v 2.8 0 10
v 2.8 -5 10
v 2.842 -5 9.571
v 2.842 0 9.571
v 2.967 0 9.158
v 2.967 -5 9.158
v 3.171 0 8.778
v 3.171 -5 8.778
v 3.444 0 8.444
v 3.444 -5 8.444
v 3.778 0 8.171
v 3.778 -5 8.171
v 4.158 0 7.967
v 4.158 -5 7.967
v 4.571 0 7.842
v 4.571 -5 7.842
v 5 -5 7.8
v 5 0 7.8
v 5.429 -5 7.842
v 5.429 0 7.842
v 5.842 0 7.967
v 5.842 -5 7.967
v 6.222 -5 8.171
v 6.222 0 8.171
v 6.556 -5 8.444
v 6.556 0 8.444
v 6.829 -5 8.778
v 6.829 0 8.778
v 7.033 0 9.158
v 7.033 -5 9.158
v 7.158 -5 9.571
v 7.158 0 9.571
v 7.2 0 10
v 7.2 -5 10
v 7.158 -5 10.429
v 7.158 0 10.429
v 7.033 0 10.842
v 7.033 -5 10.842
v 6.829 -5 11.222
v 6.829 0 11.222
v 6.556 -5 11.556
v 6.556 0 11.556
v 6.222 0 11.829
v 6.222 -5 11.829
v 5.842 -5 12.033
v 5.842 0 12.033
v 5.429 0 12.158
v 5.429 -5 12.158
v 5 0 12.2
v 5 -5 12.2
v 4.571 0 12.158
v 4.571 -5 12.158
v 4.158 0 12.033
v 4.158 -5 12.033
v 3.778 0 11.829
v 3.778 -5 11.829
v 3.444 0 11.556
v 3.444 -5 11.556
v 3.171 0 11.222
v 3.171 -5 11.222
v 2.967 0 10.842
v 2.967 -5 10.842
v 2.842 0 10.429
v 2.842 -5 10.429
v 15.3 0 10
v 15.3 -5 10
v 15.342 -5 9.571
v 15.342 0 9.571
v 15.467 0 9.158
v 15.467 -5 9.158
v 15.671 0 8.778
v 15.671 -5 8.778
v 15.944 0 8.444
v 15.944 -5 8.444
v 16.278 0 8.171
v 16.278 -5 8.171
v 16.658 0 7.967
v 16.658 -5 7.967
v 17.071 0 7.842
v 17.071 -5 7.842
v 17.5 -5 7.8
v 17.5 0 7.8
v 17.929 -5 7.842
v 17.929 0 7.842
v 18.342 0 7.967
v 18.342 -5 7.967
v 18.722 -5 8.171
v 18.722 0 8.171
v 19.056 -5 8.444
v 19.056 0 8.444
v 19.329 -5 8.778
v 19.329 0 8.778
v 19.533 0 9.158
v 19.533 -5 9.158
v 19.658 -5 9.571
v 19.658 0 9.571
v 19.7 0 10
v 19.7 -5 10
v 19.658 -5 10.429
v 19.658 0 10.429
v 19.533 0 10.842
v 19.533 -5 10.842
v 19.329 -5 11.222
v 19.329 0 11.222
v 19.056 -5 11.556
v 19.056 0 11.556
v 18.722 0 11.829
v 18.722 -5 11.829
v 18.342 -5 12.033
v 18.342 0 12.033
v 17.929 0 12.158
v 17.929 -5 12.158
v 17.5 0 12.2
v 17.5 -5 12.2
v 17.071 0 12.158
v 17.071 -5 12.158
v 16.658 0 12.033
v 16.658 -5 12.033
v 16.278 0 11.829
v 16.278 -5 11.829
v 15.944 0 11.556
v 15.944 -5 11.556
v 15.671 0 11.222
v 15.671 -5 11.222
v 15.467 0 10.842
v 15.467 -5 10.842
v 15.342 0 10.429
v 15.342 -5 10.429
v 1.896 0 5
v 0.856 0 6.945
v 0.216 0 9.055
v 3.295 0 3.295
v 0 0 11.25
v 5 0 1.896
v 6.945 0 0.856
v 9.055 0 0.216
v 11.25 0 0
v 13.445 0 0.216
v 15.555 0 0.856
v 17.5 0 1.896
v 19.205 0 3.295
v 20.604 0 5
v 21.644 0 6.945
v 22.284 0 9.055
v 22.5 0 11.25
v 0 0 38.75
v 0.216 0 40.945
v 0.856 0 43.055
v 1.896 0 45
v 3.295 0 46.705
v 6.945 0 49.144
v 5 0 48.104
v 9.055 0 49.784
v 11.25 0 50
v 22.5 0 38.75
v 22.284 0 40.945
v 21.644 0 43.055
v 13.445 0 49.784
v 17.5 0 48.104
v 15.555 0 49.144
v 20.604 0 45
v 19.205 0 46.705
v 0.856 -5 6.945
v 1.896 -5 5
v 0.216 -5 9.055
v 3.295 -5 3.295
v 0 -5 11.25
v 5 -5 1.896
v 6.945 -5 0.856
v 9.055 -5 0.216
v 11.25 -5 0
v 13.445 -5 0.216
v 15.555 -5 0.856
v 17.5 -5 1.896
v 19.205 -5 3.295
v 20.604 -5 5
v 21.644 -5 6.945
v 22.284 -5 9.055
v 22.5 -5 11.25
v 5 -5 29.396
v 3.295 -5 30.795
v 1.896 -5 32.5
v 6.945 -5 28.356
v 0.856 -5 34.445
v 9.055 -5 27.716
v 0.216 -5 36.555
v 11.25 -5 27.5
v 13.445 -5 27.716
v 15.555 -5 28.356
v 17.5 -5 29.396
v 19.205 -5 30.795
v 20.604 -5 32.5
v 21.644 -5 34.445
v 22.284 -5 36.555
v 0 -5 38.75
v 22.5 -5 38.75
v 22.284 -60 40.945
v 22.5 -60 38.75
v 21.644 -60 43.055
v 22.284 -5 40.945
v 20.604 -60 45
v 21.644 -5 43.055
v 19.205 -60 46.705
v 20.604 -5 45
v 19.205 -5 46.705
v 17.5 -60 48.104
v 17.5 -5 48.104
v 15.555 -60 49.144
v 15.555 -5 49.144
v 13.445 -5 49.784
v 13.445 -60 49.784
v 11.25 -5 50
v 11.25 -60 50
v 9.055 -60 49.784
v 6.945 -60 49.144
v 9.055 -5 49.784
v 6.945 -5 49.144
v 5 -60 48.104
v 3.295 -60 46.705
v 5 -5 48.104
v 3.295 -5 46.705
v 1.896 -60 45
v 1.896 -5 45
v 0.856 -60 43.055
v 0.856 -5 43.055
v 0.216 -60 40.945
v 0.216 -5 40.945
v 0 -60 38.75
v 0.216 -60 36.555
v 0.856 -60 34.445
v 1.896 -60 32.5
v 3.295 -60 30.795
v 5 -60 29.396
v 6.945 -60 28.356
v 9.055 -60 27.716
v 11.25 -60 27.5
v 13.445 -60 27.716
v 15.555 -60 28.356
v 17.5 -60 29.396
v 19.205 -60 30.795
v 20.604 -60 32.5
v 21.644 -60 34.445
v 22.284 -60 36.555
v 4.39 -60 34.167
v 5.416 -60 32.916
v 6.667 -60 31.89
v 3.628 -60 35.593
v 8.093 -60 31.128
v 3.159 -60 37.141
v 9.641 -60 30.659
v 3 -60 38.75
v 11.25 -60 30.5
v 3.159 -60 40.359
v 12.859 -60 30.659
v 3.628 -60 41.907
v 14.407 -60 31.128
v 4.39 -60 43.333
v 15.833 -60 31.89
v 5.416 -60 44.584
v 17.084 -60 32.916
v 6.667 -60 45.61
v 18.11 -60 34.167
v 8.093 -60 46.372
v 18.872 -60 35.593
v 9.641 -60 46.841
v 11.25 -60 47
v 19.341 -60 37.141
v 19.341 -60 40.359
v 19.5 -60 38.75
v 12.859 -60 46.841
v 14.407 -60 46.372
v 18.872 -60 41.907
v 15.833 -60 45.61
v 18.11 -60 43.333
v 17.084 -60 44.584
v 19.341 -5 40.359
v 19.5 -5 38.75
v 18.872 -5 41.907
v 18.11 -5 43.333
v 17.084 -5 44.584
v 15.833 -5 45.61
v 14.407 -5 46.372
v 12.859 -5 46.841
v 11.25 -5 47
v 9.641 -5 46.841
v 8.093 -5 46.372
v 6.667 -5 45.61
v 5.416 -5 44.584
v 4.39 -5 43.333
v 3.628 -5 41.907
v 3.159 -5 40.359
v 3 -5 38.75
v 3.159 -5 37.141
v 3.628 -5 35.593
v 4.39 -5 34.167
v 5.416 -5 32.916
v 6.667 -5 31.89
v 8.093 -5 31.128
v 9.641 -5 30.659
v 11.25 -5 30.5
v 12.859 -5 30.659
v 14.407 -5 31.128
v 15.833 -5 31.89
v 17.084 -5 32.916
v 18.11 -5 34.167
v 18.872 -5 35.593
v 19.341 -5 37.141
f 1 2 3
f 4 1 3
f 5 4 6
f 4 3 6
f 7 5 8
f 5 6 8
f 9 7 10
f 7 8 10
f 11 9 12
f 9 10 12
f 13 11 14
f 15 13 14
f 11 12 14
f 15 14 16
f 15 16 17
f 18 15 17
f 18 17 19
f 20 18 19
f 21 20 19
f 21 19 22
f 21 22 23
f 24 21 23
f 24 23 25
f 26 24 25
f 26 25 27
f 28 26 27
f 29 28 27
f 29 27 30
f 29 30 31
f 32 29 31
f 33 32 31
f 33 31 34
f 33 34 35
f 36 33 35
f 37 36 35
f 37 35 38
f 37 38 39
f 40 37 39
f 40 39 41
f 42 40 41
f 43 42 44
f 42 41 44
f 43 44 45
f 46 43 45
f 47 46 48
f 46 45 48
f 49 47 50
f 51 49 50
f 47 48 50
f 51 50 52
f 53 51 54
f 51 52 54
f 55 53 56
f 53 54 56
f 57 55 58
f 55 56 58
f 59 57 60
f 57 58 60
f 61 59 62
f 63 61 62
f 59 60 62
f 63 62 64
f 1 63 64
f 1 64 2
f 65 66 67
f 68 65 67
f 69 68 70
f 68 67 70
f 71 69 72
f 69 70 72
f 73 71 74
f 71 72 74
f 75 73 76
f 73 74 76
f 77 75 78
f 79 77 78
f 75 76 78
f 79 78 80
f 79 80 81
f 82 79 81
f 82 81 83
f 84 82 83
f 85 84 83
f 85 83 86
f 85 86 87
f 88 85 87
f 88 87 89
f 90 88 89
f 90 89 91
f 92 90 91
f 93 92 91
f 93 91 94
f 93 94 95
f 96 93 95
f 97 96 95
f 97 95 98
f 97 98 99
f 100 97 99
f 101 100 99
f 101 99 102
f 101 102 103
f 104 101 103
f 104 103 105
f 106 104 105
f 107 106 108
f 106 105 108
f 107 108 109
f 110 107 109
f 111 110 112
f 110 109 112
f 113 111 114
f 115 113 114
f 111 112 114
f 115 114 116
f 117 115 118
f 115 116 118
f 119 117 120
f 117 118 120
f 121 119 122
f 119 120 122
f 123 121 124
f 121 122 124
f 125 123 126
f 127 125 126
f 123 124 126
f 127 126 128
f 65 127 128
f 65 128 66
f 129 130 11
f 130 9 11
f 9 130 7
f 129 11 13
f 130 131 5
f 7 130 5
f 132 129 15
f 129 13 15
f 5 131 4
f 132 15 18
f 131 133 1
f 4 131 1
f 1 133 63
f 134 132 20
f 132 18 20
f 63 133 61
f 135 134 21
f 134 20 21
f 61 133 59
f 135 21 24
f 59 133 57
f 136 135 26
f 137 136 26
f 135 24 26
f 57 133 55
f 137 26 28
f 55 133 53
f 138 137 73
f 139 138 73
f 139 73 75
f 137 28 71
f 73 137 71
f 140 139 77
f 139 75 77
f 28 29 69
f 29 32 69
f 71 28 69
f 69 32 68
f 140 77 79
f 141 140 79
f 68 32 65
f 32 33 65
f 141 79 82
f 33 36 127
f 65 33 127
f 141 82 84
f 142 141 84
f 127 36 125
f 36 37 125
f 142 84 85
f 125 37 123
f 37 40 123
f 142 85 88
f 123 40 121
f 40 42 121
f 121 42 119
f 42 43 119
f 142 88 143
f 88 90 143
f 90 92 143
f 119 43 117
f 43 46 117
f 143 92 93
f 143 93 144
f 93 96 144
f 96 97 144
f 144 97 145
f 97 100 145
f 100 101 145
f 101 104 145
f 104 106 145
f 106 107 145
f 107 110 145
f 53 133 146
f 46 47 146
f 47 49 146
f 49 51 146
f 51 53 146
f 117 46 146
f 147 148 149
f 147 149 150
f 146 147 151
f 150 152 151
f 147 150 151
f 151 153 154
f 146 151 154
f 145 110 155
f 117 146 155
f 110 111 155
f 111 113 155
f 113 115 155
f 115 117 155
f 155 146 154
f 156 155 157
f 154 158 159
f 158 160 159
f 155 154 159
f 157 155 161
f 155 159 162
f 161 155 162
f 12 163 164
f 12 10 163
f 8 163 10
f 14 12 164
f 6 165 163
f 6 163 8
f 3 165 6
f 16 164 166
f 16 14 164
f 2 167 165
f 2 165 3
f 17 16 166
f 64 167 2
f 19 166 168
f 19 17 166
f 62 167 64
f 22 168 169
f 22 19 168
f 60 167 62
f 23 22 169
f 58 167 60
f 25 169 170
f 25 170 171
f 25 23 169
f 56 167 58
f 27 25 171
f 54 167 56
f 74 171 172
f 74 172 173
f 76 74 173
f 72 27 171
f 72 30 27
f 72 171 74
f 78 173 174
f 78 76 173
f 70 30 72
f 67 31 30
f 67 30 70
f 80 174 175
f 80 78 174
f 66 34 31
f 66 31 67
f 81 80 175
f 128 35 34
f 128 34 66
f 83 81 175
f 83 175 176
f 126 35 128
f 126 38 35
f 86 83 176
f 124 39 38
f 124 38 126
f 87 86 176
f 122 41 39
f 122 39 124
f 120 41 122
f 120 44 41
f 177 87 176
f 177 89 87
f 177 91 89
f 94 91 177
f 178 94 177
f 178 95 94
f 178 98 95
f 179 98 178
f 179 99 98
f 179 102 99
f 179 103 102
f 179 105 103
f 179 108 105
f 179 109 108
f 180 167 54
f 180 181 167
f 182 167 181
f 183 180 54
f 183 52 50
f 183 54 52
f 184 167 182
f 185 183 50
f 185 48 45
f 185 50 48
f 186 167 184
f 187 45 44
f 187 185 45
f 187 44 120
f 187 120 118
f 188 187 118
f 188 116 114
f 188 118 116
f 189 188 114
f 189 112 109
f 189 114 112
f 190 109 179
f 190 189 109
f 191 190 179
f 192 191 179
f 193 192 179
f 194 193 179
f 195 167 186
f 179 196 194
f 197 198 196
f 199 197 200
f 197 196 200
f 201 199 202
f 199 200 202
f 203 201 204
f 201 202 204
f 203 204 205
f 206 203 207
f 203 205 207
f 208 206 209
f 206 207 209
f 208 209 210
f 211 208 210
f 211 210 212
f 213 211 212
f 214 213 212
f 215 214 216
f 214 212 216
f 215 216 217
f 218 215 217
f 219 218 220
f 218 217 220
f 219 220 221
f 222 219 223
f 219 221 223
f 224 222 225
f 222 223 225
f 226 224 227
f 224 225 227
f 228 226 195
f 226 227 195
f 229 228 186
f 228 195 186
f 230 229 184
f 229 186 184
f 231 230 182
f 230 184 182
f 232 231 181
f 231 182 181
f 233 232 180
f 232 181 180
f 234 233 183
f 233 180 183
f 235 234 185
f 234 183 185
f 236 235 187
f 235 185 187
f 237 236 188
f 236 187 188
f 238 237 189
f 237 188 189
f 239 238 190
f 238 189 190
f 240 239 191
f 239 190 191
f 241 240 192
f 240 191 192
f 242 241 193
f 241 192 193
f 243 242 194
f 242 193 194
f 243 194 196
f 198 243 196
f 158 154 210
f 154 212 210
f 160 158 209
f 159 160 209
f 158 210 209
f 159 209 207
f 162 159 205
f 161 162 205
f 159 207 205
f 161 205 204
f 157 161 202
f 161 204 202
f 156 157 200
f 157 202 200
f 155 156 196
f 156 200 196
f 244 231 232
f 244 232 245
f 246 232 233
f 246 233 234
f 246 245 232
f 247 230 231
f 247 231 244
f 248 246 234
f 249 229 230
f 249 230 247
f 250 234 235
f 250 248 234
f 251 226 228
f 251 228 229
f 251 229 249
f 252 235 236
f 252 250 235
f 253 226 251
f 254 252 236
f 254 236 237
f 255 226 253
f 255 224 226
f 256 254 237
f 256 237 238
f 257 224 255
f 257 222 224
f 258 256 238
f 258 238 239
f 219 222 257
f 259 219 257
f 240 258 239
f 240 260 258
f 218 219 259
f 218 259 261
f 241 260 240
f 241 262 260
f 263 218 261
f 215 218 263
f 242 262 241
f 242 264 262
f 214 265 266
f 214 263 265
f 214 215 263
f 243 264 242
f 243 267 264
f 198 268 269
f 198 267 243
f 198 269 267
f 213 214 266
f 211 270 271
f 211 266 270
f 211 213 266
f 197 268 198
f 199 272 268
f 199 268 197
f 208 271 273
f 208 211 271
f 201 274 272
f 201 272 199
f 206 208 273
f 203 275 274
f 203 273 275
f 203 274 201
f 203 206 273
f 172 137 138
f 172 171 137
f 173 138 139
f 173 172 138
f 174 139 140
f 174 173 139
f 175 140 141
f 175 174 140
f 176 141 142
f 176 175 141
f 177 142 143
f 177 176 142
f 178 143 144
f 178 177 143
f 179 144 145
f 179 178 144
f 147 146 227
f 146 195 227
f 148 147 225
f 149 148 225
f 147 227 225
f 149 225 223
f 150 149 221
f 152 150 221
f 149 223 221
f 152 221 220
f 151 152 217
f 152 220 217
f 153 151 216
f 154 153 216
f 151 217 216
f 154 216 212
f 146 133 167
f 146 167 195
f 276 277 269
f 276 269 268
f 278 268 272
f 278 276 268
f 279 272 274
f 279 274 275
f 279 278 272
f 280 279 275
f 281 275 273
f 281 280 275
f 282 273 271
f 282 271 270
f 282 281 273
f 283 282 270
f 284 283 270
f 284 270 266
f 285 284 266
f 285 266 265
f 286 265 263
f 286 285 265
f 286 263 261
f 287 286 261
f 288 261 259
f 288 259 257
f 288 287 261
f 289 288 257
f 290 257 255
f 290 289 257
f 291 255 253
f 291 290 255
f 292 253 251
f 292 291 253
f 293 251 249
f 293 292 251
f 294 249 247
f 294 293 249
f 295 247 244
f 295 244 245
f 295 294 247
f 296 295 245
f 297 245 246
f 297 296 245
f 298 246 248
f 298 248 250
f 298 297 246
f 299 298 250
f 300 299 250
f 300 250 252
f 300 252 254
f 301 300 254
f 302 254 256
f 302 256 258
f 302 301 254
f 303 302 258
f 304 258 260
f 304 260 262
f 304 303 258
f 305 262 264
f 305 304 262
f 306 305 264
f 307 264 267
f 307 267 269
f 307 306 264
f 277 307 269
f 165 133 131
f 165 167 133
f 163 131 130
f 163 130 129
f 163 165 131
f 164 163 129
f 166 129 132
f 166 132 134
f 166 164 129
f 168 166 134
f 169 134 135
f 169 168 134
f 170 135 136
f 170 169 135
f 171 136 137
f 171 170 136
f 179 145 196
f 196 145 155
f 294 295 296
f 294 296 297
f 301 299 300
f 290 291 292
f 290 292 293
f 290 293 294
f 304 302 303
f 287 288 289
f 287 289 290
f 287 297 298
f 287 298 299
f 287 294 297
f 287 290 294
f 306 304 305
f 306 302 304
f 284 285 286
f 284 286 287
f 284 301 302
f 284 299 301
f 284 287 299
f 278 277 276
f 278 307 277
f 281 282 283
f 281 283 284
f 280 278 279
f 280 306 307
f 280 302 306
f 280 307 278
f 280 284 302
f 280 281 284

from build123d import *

# Parameters (mm, degrees)
F0_W     = 22.5
F0_H     = 50
F1_DEPTH = 5
F2_D     = 4.4
F4_R     = 11.24999
F3_R     = 11.25
F3_R_2   = 8.25
F5_DEPTH = 55


# Not quite as in the source:
# - a fillet or chamfer is up to 0.001 mm smaller than in the source, because OpenCascade refuses the exact size


with BuildPart() as f1:
    # F0 (on Front) → F1 (new body)
    with BuildSketch(Plane.XZ):
        with Locations((11.25, 25)):
            Rectangle(F0_W, F0_H)
    extrude(amount=F1_DEPTH)

    # F2 (through all)
    with Locations(Plane(origin=(0, 0, 0), x_dir=(1, 0, 0), z_dir=(0, 1, 0))):
        with Locations((5, -10), (17.5, -10)):
            Hole(F2_D / 2)

    # F4 (radius 11.25 in the source; OpenCascade refuses exactly that, so slightly less here)
    f4_edges = [f1.edges().sort_by_distance(p)[0] for p in [
        (22.5, -2.5, 50),
        (0, -2.5, 50),
        (22.5, -2.5, 0),
        (0, -2.5, 0),
    ]]
    fillet(f4_edges, radius=F4_R)

    # F3 (on face) → F5 (join)
    with BuildSketch(Plane.XZ.offset(5)):
        with Locations((11.25, 38.75)):
            Circle(F3_R)
        with Locations((11.25, 38.75)):
            Circle(F3_R_2, mode=Mode.SUBTRACT)
    extrude(amount=F5_DEPTH)


solid = f1.part
